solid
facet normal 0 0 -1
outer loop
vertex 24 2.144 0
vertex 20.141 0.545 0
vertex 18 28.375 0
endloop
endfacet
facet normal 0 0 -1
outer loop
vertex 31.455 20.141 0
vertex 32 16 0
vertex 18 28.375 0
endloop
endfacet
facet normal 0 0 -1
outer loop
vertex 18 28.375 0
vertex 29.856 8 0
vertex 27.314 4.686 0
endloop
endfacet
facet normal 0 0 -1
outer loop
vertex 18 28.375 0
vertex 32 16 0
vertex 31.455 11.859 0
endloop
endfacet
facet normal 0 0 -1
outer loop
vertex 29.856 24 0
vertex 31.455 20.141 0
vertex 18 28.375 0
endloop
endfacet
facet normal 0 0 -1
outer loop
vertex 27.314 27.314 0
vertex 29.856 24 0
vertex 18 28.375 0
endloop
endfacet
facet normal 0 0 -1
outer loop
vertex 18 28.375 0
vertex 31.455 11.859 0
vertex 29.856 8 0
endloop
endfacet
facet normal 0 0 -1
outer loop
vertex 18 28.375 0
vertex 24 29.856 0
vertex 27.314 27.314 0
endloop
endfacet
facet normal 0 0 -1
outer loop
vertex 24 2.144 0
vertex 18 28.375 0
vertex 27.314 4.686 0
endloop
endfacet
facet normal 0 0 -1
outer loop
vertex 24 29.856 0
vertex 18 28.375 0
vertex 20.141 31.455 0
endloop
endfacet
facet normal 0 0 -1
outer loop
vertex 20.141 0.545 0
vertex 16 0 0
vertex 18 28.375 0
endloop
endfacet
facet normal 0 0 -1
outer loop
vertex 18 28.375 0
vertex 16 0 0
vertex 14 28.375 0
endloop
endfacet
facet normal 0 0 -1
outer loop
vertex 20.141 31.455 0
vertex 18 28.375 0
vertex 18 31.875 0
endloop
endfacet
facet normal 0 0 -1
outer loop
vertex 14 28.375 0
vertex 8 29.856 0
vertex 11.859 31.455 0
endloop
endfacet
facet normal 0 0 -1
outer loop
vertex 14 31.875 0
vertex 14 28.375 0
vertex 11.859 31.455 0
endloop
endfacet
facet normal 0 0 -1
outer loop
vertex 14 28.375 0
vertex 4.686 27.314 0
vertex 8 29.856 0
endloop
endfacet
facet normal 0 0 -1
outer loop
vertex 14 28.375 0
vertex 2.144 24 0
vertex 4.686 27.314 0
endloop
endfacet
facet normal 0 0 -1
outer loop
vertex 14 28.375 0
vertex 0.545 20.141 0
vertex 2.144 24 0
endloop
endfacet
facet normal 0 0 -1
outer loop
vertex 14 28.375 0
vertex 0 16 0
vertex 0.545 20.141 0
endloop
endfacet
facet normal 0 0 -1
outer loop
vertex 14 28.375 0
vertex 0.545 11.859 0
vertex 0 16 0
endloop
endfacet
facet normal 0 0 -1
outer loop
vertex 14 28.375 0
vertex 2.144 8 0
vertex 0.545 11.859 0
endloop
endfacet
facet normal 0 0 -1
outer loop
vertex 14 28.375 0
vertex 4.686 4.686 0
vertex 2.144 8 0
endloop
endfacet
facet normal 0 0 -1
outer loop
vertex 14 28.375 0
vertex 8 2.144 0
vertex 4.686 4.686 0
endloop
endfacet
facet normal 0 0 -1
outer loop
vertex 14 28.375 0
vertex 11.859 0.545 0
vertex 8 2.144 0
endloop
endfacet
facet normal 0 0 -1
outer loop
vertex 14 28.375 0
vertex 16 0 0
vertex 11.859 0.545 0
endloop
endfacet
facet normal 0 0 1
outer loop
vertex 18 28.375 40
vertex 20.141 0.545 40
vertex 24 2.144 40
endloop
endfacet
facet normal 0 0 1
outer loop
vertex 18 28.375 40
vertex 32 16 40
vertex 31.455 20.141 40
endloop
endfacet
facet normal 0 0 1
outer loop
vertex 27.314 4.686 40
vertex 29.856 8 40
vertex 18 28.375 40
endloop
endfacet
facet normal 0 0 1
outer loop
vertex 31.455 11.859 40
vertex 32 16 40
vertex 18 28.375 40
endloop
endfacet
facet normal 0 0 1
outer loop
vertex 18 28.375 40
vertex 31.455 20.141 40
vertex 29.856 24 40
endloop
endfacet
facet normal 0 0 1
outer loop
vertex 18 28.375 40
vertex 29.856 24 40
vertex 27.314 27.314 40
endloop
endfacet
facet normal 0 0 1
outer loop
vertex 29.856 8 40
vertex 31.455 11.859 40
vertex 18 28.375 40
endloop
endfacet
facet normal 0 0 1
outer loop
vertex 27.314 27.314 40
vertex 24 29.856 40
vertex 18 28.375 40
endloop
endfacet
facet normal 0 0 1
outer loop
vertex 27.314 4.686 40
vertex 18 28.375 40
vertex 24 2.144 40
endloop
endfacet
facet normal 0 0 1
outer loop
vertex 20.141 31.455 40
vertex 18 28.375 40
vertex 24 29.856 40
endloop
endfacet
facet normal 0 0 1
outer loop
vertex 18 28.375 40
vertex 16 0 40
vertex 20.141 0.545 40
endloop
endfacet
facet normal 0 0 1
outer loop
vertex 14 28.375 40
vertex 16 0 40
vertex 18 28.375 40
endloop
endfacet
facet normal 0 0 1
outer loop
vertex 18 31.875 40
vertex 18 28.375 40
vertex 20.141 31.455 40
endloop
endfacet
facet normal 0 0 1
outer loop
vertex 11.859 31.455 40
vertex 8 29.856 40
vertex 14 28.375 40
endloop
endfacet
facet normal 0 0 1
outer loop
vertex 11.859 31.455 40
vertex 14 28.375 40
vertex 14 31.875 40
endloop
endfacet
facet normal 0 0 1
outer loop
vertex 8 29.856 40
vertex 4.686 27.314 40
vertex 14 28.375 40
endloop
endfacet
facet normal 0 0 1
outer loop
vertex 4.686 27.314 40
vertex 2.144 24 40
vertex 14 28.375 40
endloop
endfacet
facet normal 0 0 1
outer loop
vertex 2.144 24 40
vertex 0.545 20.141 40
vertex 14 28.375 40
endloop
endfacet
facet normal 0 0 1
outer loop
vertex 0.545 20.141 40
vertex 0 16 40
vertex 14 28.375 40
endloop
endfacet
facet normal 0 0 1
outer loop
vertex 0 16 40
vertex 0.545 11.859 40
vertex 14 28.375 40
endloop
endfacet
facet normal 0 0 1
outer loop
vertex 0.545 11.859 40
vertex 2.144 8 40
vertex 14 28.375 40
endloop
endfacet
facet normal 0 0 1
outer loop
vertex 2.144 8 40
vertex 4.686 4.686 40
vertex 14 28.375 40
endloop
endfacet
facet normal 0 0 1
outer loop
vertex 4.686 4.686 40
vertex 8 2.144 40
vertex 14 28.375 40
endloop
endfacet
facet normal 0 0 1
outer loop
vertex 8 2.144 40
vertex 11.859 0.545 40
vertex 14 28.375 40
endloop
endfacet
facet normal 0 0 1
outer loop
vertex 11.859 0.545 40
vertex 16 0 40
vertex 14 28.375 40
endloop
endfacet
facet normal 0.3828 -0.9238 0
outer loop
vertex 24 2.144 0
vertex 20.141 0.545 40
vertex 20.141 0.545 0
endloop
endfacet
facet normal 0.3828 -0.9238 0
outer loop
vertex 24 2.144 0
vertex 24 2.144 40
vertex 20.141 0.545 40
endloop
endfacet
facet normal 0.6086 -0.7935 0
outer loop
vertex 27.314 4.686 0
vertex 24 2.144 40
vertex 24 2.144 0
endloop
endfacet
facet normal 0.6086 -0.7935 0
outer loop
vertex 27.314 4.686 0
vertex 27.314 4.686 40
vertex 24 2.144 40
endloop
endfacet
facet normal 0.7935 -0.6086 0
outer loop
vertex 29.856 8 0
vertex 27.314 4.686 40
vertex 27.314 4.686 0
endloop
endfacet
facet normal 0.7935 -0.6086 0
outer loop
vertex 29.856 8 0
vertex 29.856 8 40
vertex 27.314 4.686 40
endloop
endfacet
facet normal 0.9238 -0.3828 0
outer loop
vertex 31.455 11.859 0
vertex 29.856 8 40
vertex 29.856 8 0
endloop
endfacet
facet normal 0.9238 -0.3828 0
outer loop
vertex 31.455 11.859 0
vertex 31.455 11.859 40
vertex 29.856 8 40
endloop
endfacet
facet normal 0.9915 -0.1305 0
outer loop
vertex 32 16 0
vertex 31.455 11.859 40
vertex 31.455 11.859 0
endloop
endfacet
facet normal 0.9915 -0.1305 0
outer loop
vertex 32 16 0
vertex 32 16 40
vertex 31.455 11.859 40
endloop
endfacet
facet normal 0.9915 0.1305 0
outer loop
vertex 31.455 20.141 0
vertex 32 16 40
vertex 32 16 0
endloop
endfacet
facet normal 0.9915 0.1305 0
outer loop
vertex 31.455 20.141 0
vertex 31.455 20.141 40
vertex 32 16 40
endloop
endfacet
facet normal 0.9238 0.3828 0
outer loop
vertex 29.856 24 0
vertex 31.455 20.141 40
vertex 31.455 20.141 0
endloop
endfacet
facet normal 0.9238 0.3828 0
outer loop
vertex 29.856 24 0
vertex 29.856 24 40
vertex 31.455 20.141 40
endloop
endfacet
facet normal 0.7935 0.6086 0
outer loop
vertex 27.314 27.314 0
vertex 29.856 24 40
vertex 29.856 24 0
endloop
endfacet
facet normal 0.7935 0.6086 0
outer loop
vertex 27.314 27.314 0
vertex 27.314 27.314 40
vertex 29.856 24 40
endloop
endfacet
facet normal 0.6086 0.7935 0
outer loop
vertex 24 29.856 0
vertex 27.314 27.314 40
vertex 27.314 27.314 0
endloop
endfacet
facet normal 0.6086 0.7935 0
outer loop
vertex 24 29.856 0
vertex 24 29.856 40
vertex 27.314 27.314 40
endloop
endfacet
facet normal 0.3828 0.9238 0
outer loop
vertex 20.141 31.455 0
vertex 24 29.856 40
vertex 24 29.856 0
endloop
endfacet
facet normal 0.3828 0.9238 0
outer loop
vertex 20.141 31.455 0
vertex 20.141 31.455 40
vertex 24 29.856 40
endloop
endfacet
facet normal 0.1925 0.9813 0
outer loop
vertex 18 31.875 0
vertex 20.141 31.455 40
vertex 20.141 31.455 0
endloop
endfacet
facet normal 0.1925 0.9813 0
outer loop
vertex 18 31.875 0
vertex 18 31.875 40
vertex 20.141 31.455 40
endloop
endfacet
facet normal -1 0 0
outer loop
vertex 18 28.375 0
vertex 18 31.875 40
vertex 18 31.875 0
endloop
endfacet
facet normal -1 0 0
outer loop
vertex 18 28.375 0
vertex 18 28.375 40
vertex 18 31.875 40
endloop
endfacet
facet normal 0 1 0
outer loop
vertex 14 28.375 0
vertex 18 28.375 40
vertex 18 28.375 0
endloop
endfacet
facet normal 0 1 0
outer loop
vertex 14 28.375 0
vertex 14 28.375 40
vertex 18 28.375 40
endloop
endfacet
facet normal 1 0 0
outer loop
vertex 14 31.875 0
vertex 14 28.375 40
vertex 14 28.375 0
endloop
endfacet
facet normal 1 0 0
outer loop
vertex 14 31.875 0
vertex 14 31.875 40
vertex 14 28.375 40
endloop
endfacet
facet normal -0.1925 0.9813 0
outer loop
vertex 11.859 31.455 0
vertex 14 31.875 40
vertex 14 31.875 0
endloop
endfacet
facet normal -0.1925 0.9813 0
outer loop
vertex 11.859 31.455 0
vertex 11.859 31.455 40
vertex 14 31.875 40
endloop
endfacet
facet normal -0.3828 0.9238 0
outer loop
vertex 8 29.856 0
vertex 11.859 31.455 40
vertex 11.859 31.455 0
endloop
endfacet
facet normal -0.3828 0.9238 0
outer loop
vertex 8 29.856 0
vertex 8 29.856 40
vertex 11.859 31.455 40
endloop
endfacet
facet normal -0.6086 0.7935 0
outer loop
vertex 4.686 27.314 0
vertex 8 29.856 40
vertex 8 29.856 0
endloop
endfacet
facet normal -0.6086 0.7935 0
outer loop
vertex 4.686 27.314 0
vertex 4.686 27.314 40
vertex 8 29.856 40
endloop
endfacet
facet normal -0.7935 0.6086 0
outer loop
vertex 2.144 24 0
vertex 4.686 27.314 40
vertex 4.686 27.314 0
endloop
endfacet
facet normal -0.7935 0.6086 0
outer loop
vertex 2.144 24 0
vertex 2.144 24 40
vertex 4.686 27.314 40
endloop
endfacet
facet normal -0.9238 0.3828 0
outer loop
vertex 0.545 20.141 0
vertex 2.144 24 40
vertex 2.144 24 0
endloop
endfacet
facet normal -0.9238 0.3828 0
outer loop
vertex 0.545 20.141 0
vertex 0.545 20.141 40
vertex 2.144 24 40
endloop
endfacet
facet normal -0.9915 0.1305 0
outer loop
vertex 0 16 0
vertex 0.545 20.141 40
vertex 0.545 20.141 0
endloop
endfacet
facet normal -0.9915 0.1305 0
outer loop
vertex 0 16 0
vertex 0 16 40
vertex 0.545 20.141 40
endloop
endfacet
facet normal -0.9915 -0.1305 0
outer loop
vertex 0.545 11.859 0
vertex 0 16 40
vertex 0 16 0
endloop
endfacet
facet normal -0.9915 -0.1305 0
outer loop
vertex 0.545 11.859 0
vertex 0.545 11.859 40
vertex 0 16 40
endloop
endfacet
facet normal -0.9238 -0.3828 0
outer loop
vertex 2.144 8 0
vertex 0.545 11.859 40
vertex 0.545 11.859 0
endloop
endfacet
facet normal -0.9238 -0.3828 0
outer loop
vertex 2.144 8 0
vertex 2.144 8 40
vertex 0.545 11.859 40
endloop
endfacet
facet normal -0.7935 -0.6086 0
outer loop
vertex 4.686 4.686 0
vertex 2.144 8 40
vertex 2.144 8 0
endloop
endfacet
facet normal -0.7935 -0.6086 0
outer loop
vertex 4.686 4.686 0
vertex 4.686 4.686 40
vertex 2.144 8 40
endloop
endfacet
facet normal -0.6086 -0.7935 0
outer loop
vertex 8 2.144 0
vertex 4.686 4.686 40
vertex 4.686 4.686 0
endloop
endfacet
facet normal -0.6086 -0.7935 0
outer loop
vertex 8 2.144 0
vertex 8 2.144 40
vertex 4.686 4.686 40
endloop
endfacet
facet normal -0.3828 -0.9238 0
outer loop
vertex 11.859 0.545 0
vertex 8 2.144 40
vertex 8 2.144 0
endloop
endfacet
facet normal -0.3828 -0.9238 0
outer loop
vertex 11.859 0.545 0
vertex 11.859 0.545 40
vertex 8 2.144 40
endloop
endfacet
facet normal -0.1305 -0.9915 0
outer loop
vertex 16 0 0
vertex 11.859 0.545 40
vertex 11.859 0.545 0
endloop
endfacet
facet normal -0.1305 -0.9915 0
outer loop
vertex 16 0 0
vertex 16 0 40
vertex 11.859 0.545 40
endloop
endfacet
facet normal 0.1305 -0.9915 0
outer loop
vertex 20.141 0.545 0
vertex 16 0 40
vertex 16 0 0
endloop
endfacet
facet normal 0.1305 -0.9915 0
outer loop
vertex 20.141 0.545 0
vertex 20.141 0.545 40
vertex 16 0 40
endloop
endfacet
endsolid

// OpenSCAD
$fn = 32;

// ----------------------------------------------------------------------
// Keyway shaft: d32 shaft, key 4 x 3.5 mm
// ----------------------------------------------------------------------

// --- parameters (mm) ---
shaft_r = 16;             // shaft radius
key_w = 4;                // keyway width
key_d = 3.5;              // keyway depth below the surface line
plate_t = 40;             // shaft length, Z (extrusion height)

shaft_d = 2 * shaft_r;  // shaft diameter
circle_step = 15;  // polygon sampling step, degrees

profile = [[11.859, 31.455], [8, 29.856], [4.686, 27.314], [2.144, 24], [0.545, 20.141], [0, 16], [0.545, 11.859], [2.144, 8], [4.686, 4.686], [8, 2.144], [11.859, 0.545], [16, 0], [20.141, 0.545], [24, 2.144], [27.314, 4.686], [29.856, 8], [31.455, 11.859], [32, 16], [31.455, 20.141], [29.856, 24], [27.314, 27.314], [24, 29.856], [20.141, 31.455], [18, 31.875], [18, 28.375], [14, 28.375], [14, 31.875]];  // primary outline, 27 points, counter clockwise

// --- the one profile operation ---
linear_extrude(height = plate_t) polygon(points = profile);
